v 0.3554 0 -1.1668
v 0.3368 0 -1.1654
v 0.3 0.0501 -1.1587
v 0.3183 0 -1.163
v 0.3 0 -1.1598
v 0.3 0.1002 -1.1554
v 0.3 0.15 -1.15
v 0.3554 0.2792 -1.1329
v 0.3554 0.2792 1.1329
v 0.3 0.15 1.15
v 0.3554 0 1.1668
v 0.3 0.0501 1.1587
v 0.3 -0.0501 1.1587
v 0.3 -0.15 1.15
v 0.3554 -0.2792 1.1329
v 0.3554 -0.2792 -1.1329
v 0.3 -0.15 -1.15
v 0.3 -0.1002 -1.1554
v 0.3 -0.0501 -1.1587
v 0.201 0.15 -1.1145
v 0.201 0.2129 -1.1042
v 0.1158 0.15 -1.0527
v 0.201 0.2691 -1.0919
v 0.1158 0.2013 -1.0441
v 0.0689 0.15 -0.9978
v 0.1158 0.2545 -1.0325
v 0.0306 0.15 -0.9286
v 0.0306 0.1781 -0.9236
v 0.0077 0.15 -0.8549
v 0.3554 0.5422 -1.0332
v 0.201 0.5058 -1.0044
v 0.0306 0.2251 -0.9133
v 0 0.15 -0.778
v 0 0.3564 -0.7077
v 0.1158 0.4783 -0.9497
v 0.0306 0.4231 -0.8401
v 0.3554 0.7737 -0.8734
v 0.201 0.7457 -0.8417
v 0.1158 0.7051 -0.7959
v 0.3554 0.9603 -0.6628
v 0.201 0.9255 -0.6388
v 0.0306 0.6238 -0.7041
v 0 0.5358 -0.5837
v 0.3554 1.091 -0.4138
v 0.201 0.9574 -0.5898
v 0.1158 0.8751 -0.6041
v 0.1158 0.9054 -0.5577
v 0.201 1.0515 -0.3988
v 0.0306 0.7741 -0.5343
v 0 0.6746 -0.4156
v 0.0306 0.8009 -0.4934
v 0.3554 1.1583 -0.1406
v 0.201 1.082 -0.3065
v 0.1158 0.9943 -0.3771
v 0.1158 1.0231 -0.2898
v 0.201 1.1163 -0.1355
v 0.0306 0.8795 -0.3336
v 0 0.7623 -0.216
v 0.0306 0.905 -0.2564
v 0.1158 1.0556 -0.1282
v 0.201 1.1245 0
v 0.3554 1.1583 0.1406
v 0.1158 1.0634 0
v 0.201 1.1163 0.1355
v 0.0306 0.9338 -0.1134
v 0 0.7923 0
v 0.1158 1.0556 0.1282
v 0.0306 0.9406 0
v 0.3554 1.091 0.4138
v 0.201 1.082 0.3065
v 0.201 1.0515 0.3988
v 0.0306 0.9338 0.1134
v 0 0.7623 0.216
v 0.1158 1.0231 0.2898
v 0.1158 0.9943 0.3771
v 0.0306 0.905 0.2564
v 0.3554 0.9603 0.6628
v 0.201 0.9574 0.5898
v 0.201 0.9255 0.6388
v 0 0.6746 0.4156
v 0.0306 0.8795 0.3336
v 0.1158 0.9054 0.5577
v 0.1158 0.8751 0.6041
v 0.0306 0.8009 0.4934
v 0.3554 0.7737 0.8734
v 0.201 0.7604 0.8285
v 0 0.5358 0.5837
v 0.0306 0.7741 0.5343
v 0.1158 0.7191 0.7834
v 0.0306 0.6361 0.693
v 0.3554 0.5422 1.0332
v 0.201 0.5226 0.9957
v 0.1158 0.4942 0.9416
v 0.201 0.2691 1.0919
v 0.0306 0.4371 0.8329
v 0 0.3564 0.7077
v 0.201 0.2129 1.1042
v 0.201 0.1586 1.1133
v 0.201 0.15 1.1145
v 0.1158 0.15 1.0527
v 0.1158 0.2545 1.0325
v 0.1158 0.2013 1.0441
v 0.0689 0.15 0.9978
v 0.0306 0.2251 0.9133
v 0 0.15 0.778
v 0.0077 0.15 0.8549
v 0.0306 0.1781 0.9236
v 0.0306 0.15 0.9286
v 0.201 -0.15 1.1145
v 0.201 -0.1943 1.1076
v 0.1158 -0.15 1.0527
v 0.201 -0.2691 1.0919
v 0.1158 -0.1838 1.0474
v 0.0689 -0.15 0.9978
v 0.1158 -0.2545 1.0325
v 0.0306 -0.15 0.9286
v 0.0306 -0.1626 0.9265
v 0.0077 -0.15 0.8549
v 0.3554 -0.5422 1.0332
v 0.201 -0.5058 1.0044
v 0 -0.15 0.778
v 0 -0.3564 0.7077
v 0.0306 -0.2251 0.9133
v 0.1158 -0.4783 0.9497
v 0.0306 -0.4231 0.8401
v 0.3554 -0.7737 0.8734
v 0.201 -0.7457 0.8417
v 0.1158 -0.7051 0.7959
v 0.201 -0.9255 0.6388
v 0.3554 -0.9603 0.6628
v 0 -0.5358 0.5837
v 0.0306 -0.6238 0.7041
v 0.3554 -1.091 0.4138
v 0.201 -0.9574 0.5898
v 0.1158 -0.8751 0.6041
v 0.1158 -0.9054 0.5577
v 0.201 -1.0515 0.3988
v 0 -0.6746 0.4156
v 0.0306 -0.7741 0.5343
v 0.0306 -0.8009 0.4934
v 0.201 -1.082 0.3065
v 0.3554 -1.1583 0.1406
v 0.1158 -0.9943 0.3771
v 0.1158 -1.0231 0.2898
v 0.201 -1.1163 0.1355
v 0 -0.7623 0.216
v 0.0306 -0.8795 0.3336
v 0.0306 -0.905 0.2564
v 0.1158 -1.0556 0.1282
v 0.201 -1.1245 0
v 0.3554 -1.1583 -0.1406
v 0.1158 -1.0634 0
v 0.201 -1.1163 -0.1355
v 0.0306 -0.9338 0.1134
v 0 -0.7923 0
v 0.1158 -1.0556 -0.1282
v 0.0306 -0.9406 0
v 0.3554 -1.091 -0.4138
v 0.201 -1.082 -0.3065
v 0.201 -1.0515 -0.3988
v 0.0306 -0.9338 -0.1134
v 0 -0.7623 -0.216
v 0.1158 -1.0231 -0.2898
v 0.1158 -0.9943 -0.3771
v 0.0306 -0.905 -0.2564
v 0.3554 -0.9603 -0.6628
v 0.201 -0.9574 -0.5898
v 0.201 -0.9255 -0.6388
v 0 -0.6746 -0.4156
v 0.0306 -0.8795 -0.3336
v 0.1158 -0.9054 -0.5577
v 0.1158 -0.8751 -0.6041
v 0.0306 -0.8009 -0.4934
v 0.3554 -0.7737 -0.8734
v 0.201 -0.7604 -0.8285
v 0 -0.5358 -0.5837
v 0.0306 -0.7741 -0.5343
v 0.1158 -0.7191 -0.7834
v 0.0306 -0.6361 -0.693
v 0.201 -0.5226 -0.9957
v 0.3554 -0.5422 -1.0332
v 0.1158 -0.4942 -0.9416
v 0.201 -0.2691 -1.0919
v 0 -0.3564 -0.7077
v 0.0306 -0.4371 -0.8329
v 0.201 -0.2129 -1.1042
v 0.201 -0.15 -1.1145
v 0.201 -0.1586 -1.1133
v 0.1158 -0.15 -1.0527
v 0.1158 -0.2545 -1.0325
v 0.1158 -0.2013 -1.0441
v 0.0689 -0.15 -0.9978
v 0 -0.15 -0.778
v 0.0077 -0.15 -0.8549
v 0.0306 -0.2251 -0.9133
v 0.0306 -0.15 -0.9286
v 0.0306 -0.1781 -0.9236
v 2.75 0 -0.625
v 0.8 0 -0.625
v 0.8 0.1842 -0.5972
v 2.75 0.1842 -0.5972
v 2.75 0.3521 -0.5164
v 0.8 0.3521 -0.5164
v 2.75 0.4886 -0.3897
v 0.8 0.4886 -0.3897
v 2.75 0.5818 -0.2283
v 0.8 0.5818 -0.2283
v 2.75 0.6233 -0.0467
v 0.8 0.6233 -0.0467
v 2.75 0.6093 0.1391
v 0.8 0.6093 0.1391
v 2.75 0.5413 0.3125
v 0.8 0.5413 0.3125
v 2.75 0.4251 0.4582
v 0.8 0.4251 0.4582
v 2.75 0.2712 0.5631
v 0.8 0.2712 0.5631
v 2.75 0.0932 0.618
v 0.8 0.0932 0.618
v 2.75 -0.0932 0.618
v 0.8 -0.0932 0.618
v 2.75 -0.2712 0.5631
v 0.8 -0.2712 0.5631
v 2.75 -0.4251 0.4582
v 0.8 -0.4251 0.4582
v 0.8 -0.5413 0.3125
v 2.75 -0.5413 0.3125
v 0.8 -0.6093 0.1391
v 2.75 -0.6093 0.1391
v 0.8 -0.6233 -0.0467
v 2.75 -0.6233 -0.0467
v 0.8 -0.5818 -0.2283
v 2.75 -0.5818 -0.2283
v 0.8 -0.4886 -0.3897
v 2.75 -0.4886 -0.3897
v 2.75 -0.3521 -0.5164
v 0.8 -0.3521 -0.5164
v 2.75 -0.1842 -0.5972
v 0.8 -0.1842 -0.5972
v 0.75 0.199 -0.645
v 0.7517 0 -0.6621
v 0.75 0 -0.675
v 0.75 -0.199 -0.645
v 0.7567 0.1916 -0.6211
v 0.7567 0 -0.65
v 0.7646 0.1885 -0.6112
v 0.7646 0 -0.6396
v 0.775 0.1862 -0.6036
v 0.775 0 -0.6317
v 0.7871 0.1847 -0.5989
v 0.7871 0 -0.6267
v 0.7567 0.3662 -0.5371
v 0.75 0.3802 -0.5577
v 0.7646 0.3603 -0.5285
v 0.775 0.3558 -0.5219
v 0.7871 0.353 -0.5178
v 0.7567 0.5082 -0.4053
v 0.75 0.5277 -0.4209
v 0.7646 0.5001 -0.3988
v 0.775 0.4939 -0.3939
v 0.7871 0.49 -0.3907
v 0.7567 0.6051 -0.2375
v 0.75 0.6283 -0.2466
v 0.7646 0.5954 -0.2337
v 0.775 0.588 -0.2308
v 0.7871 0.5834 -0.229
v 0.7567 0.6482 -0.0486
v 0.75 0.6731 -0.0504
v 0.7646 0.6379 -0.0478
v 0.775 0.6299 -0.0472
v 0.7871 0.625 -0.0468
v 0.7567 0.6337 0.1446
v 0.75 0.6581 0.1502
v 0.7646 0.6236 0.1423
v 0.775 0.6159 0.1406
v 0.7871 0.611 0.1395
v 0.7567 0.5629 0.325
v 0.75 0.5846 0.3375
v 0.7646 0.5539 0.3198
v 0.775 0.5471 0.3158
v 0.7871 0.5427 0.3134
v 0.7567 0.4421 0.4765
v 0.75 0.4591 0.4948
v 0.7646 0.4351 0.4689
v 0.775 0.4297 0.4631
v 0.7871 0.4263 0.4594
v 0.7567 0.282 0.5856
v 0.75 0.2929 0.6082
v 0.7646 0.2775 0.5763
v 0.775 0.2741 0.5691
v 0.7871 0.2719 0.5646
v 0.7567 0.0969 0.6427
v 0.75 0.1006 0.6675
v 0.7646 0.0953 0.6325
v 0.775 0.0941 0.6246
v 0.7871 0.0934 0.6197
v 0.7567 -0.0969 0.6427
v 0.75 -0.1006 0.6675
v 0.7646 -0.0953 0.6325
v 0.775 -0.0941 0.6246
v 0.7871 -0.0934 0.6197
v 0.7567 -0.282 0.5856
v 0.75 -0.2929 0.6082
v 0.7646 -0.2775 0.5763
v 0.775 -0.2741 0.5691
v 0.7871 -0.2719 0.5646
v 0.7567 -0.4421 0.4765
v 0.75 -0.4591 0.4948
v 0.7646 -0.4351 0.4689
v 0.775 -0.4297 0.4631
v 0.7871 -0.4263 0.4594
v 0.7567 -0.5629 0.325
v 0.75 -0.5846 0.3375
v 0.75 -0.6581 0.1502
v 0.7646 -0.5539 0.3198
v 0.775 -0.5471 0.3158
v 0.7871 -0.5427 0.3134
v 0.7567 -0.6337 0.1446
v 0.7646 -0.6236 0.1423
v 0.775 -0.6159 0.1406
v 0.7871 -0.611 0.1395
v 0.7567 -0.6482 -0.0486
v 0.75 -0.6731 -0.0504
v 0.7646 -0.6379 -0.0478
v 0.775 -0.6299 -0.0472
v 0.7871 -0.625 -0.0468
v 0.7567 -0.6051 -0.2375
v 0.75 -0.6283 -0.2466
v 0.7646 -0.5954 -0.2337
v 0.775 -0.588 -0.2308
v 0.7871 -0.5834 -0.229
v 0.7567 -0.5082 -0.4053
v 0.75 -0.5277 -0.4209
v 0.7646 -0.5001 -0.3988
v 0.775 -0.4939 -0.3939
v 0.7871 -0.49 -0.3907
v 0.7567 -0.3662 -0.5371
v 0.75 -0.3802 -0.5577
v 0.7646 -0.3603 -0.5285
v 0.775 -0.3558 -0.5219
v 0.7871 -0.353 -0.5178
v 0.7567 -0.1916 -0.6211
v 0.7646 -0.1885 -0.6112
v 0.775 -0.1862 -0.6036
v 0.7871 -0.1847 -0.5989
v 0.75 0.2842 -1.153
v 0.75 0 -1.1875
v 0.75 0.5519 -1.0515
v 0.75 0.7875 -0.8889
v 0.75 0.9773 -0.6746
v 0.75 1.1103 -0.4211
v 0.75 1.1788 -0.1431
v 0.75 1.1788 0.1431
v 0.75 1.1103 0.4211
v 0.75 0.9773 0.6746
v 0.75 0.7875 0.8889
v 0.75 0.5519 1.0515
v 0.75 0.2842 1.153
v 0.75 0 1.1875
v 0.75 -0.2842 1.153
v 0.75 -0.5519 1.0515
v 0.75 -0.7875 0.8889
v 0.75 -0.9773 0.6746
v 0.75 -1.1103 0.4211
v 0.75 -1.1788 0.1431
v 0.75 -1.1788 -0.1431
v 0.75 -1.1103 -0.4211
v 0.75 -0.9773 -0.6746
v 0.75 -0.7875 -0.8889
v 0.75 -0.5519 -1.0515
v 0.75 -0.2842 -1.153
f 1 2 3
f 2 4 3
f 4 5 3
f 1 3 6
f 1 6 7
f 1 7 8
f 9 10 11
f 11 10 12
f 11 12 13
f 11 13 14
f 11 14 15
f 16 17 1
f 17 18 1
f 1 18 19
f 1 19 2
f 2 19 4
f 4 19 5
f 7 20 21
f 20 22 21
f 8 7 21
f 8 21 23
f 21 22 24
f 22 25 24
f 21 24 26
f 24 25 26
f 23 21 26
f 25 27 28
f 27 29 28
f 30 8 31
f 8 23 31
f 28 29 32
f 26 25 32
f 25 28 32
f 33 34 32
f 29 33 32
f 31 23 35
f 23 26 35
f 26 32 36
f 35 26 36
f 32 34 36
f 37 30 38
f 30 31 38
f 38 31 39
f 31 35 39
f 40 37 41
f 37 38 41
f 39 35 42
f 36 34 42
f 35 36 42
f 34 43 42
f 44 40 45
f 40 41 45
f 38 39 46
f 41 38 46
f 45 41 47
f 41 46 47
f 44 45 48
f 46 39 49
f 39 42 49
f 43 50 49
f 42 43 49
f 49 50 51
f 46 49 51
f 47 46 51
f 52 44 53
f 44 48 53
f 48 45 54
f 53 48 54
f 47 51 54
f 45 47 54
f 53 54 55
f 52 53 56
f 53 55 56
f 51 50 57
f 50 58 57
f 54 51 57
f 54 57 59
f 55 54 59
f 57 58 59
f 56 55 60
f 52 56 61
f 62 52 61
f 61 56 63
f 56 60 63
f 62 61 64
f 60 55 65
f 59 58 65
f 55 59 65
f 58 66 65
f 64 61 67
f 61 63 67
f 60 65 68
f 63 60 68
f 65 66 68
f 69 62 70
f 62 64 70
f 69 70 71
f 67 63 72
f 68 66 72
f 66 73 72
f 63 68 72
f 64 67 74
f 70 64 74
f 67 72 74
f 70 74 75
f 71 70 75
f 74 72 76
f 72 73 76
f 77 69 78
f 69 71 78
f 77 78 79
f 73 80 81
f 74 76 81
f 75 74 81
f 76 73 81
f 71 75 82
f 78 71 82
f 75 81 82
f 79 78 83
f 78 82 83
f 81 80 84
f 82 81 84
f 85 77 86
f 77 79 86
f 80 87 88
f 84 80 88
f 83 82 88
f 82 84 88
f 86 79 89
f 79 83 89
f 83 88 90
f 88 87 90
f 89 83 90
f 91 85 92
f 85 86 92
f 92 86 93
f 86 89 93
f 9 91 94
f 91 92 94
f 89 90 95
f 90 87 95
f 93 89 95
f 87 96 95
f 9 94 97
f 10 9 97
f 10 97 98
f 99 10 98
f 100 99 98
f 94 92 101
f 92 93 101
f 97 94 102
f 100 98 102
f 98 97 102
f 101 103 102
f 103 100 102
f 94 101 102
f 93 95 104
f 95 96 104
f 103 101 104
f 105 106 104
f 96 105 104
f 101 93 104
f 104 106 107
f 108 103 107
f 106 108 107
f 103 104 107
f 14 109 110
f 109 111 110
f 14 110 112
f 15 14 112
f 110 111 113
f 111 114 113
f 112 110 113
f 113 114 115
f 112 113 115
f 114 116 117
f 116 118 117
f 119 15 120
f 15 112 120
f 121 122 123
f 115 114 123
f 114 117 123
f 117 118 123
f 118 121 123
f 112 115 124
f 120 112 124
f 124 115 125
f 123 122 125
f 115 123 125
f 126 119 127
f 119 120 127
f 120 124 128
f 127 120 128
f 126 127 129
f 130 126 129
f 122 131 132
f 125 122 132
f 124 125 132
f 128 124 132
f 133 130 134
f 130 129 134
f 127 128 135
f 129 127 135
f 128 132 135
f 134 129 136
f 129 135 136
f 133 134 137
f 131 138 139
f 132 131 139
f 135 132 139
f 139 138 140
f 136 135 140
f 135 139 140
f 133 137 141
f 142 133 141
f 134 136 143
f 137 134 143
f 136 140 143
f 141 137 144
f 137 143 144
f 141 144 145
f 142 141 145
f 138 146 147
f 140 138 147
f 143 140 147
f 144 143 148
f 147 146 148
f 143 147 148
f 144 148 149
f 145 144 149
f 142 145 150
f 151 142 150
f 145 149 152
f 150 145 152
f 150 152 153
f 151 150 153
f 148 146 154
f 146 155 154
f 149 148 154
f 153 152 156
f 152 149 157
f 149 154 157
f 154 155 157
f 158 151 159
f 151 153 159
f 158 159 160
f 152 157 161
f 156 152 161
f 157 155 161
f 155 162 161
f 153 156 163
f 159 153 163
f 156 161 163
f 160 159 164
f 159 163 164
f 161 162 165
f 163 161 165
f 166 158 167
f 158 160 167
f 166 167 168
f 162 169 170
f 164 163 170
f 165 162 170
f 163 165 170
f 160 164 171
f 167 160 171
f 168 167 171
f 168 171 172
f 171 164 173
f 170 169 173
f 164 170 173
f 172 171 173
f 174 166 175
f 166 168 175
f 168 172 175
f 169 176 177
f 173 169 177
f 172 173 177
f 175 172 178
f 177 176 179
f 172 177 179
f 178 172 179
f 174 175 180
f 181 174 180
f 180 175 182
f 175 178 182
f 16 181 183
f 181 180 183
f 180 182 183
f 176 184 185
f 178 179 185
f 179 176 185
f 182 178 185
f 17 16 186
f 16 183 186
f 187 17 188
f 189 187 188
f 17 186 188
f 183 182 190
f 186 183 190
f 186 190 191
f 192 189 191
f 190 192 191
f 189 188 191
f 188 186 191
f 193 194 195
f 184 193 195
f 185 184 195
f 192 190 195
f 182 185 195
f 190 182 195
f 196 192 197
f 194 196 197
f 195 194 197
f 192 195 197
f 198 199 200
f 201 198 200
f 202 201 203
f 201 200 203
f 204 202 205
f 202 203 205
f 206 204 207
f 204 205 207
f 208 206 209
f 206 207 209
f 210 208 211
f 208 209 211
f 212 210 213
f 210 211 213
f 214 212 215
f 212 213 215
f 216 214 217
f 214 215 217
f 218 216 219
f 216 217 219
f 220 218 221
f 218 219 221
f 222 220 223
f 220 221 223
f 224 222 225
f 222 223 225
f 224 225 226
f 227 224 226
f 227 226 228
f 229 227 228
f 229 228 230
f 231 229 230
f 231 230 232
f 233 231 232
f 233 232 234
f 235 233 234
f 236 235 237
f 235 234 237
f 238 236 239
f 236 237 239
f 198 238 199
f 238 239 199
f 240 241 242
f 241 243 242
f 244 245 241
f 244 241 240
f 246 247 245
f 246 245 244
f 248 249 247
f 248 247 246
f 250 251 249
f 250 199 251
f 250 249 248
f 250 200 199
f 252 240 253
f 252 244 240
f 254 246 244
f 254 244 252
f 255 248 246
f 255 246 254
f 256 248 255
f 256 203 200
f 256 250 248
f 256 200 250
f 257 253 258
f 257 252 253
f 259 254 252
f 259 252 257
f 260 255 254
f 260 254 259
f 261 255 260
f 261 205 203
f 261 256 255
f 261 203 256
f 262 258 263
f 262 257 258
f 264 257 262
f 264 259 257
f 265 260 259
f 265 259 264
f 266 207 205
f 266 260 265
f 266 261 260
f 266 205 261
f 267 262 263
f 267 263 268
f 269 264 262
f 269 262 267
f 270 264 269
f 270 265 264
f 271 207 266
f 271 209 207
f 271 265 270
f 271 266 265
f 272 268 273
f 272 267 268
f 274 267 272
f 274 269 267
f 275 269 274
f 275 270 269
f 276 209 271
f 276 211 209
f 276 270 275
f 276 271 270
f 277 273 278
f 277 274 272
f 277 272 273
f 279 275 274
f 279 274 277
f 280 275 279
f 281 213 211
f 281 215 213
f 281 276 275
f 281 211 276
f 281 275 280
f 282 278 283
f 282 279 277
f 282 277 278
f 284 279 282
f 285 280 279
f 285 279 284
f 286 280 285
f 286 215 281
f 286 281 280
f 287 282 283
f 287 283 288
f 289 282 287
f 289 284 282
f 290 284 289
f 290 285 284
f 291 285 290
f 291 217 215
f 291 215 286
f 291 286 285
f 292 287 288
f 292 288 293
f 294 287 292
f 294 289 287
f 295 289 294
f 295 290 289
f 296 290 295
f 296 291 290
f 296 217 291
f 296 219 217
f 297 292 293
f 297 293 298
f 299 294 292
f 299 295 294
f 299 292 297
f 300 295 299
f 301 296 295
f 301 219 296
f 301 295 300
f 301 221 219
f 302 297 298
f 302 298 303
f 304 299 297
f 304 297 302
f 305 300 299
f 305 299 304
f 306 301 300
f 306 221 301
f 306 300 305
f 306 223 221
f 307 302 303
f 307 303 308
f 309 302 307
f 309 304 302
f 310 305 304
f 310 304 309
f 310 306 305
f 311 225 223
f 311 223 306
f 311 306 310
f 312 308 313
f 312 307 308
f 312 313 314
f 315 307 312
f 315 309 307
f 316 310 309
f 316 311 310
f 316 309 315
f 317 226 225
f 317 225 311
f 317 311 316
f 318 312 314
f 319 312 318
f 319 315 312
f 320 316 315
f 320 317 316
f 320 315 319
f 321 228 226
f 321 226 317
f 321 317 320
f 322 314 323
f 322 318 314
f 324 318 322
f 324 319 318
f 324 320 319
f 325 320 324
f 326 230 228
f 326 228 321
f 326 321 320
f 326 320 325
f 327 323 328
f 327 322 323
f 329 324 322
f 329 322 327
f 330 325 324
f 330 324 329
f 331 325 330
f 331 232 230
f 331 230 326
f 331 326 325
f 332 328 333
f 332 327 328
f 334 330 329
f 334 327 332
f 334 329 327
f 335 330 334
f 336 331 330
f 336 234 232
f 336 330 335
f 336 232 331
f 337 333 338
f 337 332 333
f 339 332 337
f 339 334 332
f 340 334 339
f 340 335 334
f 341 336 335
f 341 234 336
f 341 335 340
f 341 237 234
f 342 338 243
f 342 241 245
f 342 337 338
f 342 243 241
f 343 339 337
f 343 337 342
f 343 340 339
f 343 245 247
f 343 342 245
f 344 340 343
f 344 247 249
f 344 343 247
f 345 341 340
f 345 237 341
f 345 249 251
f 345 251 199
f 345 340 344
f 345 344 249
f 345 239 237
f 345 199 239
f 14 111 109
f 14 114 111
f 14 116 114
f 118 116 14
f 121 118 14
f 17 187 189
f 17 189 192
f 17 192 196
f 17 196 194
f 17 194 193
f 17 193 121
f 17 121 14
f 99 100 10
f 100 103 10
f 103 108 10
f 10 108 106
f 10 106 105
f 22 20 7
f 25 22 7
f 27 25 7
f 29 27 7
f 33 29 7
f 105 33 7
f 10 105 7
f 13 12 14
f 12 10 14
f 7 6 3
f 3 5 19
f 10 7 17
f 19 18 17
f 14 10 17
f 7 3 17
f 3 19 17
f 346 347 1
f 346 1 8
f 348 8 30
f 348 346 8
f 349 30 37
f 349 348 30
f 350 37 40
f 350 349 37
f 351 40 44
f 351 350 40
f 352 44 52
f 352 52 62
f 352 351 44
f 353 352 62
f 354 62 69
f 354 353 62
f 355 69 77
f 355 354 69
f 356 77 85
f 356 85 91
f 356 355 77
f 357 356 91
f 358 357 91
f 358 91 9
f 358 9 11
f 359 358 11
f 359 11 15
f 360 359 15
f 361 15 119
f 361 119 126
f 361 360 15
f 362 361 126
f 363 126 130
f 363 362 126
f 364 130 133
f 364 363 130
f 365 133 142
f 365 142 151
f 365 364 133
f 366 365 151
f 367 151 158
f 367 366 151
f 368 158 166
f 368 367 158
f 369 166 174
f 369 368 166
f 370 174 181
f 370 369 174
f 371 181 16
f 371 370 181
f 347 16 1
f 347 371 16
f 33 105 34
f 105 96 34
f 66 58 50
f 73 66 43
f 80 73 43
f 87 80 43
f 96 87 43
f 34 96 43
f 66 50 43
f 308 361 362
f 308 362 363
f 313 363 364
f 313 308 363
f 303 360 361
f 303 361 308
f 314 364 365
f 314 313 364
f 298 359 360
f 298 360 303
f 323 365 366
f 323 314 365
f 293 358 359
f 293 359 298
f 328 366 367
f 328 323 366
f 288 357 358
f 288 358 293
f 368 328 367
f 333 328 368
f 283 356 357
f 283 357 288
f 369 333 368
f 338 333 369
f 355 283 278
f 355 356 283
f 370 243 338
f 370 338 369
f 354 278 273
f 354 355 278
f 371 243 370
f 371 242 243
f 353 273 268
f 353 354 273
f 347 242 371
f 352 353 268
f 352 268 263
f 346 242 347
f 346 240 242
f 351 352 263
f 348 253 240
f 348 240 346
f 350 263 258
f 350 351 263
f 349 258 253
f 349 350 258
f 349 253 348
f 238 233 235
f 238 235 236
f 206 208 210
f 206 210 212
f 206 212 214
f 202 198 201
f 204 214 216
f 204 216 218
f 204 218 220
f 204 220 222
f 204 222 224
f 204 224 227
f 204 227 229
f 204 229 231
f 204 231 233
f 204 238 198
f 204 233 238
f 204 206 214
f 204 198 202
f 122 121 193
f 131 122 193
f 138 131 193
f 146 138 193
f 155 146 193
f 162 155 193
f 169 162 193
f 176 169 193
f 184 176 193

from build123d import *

# Parameters (mm, degrees)
SKETCH1_R        = 4.75
BASEHEAD_DEPTH   = 3
BASEHEAD_DRAFT   = -3
SKETCH2_R        = 2.5
BASEBODY_DEPTH   = 8
HEADFILLET2_R    = 1.5
NOTCH_DEPTH      = 13.458129876
NOTCH_DEPTH_BACK = 13.458129876
SKETCH3_W        = 1.2
SKETCH3_H        = 1.2
HEADFILLET1_R    = 0.2
SCALE_1_SCALE    = 0.25


with BuildPart() as part:
    # Sketch1 → BaseHead (with draft: the straight prism first)
    with BuildSketch(Plane(origin=(3, 0, 0), x_dir=(0, 0, -1), z_dir=(1, 0, 0))):
        Circle(SKETCH1_R)
    extrude(amount=-BASEHEAD_DEPTH)
    # BaseHead: the draft: its side faces are tilted about the plane it starts from
    basehead_sides = [part.faces().sort_by_distance(p)[0] for p in [
        (1.5, 0, 4.75),
    ]]
    draft(basehead_sides, Plane(origin=(3, 0, 0), x_dir=(0, 0, -1), z_dir=(1, 0, 0)), BASEHEAD_DRAFT)

    # Sketch2 → BaseBody (add)
    with BuildSketch(Plane(origin=(3, 0, 0), x_dir=(0, 0, -1), z_dir=(1, 0, 0))):
        Circle(SKETCH2_R)
    extrude(amount=BASEBODY_DEPTH)

    # HeadFillet2
    headfillet2_edges = [part.edges().sort_by_distance(p)[0] for p in [
        (0, 0, 4.592776662),
    ]]
    fillet(headfillet2_edges, radius=HEADFILLET2_R)

    # Sketch3 → Notch (cut, two sides: drawn at the far end of the back side and taken through both)
    with BuildSketch(Plane(origin=(1.05, -1.05, 0), x_dir=(0, -1, 0), z_dir=(0, 0, 1)).offset(-NOTCH_DEPTH_BACK)):
        with Locations((-1.05, -0.45)):
            Rectangle(SKETCH3_W, SKETCH3_H)
    extrude(amount=NOTCH_DEPTH + NOTCH_DEPTH_BACK, mode=Mode.SUBTRACT)

    # HeadFillet1
    headfillet1_edges = [part.edges().sort_by_distance(p)[0] for p in [
        (3, 0, 2.5),
    ]]
    fillet(headfillet1_edges, radius=HEADFILLET1_R)


with BuildPart() as part_1:
    # 缩放比例1: scaled about (0, 0, 0)
    add(part.part.scale(SCALE_1_SCALE))


solid = part_1.part
